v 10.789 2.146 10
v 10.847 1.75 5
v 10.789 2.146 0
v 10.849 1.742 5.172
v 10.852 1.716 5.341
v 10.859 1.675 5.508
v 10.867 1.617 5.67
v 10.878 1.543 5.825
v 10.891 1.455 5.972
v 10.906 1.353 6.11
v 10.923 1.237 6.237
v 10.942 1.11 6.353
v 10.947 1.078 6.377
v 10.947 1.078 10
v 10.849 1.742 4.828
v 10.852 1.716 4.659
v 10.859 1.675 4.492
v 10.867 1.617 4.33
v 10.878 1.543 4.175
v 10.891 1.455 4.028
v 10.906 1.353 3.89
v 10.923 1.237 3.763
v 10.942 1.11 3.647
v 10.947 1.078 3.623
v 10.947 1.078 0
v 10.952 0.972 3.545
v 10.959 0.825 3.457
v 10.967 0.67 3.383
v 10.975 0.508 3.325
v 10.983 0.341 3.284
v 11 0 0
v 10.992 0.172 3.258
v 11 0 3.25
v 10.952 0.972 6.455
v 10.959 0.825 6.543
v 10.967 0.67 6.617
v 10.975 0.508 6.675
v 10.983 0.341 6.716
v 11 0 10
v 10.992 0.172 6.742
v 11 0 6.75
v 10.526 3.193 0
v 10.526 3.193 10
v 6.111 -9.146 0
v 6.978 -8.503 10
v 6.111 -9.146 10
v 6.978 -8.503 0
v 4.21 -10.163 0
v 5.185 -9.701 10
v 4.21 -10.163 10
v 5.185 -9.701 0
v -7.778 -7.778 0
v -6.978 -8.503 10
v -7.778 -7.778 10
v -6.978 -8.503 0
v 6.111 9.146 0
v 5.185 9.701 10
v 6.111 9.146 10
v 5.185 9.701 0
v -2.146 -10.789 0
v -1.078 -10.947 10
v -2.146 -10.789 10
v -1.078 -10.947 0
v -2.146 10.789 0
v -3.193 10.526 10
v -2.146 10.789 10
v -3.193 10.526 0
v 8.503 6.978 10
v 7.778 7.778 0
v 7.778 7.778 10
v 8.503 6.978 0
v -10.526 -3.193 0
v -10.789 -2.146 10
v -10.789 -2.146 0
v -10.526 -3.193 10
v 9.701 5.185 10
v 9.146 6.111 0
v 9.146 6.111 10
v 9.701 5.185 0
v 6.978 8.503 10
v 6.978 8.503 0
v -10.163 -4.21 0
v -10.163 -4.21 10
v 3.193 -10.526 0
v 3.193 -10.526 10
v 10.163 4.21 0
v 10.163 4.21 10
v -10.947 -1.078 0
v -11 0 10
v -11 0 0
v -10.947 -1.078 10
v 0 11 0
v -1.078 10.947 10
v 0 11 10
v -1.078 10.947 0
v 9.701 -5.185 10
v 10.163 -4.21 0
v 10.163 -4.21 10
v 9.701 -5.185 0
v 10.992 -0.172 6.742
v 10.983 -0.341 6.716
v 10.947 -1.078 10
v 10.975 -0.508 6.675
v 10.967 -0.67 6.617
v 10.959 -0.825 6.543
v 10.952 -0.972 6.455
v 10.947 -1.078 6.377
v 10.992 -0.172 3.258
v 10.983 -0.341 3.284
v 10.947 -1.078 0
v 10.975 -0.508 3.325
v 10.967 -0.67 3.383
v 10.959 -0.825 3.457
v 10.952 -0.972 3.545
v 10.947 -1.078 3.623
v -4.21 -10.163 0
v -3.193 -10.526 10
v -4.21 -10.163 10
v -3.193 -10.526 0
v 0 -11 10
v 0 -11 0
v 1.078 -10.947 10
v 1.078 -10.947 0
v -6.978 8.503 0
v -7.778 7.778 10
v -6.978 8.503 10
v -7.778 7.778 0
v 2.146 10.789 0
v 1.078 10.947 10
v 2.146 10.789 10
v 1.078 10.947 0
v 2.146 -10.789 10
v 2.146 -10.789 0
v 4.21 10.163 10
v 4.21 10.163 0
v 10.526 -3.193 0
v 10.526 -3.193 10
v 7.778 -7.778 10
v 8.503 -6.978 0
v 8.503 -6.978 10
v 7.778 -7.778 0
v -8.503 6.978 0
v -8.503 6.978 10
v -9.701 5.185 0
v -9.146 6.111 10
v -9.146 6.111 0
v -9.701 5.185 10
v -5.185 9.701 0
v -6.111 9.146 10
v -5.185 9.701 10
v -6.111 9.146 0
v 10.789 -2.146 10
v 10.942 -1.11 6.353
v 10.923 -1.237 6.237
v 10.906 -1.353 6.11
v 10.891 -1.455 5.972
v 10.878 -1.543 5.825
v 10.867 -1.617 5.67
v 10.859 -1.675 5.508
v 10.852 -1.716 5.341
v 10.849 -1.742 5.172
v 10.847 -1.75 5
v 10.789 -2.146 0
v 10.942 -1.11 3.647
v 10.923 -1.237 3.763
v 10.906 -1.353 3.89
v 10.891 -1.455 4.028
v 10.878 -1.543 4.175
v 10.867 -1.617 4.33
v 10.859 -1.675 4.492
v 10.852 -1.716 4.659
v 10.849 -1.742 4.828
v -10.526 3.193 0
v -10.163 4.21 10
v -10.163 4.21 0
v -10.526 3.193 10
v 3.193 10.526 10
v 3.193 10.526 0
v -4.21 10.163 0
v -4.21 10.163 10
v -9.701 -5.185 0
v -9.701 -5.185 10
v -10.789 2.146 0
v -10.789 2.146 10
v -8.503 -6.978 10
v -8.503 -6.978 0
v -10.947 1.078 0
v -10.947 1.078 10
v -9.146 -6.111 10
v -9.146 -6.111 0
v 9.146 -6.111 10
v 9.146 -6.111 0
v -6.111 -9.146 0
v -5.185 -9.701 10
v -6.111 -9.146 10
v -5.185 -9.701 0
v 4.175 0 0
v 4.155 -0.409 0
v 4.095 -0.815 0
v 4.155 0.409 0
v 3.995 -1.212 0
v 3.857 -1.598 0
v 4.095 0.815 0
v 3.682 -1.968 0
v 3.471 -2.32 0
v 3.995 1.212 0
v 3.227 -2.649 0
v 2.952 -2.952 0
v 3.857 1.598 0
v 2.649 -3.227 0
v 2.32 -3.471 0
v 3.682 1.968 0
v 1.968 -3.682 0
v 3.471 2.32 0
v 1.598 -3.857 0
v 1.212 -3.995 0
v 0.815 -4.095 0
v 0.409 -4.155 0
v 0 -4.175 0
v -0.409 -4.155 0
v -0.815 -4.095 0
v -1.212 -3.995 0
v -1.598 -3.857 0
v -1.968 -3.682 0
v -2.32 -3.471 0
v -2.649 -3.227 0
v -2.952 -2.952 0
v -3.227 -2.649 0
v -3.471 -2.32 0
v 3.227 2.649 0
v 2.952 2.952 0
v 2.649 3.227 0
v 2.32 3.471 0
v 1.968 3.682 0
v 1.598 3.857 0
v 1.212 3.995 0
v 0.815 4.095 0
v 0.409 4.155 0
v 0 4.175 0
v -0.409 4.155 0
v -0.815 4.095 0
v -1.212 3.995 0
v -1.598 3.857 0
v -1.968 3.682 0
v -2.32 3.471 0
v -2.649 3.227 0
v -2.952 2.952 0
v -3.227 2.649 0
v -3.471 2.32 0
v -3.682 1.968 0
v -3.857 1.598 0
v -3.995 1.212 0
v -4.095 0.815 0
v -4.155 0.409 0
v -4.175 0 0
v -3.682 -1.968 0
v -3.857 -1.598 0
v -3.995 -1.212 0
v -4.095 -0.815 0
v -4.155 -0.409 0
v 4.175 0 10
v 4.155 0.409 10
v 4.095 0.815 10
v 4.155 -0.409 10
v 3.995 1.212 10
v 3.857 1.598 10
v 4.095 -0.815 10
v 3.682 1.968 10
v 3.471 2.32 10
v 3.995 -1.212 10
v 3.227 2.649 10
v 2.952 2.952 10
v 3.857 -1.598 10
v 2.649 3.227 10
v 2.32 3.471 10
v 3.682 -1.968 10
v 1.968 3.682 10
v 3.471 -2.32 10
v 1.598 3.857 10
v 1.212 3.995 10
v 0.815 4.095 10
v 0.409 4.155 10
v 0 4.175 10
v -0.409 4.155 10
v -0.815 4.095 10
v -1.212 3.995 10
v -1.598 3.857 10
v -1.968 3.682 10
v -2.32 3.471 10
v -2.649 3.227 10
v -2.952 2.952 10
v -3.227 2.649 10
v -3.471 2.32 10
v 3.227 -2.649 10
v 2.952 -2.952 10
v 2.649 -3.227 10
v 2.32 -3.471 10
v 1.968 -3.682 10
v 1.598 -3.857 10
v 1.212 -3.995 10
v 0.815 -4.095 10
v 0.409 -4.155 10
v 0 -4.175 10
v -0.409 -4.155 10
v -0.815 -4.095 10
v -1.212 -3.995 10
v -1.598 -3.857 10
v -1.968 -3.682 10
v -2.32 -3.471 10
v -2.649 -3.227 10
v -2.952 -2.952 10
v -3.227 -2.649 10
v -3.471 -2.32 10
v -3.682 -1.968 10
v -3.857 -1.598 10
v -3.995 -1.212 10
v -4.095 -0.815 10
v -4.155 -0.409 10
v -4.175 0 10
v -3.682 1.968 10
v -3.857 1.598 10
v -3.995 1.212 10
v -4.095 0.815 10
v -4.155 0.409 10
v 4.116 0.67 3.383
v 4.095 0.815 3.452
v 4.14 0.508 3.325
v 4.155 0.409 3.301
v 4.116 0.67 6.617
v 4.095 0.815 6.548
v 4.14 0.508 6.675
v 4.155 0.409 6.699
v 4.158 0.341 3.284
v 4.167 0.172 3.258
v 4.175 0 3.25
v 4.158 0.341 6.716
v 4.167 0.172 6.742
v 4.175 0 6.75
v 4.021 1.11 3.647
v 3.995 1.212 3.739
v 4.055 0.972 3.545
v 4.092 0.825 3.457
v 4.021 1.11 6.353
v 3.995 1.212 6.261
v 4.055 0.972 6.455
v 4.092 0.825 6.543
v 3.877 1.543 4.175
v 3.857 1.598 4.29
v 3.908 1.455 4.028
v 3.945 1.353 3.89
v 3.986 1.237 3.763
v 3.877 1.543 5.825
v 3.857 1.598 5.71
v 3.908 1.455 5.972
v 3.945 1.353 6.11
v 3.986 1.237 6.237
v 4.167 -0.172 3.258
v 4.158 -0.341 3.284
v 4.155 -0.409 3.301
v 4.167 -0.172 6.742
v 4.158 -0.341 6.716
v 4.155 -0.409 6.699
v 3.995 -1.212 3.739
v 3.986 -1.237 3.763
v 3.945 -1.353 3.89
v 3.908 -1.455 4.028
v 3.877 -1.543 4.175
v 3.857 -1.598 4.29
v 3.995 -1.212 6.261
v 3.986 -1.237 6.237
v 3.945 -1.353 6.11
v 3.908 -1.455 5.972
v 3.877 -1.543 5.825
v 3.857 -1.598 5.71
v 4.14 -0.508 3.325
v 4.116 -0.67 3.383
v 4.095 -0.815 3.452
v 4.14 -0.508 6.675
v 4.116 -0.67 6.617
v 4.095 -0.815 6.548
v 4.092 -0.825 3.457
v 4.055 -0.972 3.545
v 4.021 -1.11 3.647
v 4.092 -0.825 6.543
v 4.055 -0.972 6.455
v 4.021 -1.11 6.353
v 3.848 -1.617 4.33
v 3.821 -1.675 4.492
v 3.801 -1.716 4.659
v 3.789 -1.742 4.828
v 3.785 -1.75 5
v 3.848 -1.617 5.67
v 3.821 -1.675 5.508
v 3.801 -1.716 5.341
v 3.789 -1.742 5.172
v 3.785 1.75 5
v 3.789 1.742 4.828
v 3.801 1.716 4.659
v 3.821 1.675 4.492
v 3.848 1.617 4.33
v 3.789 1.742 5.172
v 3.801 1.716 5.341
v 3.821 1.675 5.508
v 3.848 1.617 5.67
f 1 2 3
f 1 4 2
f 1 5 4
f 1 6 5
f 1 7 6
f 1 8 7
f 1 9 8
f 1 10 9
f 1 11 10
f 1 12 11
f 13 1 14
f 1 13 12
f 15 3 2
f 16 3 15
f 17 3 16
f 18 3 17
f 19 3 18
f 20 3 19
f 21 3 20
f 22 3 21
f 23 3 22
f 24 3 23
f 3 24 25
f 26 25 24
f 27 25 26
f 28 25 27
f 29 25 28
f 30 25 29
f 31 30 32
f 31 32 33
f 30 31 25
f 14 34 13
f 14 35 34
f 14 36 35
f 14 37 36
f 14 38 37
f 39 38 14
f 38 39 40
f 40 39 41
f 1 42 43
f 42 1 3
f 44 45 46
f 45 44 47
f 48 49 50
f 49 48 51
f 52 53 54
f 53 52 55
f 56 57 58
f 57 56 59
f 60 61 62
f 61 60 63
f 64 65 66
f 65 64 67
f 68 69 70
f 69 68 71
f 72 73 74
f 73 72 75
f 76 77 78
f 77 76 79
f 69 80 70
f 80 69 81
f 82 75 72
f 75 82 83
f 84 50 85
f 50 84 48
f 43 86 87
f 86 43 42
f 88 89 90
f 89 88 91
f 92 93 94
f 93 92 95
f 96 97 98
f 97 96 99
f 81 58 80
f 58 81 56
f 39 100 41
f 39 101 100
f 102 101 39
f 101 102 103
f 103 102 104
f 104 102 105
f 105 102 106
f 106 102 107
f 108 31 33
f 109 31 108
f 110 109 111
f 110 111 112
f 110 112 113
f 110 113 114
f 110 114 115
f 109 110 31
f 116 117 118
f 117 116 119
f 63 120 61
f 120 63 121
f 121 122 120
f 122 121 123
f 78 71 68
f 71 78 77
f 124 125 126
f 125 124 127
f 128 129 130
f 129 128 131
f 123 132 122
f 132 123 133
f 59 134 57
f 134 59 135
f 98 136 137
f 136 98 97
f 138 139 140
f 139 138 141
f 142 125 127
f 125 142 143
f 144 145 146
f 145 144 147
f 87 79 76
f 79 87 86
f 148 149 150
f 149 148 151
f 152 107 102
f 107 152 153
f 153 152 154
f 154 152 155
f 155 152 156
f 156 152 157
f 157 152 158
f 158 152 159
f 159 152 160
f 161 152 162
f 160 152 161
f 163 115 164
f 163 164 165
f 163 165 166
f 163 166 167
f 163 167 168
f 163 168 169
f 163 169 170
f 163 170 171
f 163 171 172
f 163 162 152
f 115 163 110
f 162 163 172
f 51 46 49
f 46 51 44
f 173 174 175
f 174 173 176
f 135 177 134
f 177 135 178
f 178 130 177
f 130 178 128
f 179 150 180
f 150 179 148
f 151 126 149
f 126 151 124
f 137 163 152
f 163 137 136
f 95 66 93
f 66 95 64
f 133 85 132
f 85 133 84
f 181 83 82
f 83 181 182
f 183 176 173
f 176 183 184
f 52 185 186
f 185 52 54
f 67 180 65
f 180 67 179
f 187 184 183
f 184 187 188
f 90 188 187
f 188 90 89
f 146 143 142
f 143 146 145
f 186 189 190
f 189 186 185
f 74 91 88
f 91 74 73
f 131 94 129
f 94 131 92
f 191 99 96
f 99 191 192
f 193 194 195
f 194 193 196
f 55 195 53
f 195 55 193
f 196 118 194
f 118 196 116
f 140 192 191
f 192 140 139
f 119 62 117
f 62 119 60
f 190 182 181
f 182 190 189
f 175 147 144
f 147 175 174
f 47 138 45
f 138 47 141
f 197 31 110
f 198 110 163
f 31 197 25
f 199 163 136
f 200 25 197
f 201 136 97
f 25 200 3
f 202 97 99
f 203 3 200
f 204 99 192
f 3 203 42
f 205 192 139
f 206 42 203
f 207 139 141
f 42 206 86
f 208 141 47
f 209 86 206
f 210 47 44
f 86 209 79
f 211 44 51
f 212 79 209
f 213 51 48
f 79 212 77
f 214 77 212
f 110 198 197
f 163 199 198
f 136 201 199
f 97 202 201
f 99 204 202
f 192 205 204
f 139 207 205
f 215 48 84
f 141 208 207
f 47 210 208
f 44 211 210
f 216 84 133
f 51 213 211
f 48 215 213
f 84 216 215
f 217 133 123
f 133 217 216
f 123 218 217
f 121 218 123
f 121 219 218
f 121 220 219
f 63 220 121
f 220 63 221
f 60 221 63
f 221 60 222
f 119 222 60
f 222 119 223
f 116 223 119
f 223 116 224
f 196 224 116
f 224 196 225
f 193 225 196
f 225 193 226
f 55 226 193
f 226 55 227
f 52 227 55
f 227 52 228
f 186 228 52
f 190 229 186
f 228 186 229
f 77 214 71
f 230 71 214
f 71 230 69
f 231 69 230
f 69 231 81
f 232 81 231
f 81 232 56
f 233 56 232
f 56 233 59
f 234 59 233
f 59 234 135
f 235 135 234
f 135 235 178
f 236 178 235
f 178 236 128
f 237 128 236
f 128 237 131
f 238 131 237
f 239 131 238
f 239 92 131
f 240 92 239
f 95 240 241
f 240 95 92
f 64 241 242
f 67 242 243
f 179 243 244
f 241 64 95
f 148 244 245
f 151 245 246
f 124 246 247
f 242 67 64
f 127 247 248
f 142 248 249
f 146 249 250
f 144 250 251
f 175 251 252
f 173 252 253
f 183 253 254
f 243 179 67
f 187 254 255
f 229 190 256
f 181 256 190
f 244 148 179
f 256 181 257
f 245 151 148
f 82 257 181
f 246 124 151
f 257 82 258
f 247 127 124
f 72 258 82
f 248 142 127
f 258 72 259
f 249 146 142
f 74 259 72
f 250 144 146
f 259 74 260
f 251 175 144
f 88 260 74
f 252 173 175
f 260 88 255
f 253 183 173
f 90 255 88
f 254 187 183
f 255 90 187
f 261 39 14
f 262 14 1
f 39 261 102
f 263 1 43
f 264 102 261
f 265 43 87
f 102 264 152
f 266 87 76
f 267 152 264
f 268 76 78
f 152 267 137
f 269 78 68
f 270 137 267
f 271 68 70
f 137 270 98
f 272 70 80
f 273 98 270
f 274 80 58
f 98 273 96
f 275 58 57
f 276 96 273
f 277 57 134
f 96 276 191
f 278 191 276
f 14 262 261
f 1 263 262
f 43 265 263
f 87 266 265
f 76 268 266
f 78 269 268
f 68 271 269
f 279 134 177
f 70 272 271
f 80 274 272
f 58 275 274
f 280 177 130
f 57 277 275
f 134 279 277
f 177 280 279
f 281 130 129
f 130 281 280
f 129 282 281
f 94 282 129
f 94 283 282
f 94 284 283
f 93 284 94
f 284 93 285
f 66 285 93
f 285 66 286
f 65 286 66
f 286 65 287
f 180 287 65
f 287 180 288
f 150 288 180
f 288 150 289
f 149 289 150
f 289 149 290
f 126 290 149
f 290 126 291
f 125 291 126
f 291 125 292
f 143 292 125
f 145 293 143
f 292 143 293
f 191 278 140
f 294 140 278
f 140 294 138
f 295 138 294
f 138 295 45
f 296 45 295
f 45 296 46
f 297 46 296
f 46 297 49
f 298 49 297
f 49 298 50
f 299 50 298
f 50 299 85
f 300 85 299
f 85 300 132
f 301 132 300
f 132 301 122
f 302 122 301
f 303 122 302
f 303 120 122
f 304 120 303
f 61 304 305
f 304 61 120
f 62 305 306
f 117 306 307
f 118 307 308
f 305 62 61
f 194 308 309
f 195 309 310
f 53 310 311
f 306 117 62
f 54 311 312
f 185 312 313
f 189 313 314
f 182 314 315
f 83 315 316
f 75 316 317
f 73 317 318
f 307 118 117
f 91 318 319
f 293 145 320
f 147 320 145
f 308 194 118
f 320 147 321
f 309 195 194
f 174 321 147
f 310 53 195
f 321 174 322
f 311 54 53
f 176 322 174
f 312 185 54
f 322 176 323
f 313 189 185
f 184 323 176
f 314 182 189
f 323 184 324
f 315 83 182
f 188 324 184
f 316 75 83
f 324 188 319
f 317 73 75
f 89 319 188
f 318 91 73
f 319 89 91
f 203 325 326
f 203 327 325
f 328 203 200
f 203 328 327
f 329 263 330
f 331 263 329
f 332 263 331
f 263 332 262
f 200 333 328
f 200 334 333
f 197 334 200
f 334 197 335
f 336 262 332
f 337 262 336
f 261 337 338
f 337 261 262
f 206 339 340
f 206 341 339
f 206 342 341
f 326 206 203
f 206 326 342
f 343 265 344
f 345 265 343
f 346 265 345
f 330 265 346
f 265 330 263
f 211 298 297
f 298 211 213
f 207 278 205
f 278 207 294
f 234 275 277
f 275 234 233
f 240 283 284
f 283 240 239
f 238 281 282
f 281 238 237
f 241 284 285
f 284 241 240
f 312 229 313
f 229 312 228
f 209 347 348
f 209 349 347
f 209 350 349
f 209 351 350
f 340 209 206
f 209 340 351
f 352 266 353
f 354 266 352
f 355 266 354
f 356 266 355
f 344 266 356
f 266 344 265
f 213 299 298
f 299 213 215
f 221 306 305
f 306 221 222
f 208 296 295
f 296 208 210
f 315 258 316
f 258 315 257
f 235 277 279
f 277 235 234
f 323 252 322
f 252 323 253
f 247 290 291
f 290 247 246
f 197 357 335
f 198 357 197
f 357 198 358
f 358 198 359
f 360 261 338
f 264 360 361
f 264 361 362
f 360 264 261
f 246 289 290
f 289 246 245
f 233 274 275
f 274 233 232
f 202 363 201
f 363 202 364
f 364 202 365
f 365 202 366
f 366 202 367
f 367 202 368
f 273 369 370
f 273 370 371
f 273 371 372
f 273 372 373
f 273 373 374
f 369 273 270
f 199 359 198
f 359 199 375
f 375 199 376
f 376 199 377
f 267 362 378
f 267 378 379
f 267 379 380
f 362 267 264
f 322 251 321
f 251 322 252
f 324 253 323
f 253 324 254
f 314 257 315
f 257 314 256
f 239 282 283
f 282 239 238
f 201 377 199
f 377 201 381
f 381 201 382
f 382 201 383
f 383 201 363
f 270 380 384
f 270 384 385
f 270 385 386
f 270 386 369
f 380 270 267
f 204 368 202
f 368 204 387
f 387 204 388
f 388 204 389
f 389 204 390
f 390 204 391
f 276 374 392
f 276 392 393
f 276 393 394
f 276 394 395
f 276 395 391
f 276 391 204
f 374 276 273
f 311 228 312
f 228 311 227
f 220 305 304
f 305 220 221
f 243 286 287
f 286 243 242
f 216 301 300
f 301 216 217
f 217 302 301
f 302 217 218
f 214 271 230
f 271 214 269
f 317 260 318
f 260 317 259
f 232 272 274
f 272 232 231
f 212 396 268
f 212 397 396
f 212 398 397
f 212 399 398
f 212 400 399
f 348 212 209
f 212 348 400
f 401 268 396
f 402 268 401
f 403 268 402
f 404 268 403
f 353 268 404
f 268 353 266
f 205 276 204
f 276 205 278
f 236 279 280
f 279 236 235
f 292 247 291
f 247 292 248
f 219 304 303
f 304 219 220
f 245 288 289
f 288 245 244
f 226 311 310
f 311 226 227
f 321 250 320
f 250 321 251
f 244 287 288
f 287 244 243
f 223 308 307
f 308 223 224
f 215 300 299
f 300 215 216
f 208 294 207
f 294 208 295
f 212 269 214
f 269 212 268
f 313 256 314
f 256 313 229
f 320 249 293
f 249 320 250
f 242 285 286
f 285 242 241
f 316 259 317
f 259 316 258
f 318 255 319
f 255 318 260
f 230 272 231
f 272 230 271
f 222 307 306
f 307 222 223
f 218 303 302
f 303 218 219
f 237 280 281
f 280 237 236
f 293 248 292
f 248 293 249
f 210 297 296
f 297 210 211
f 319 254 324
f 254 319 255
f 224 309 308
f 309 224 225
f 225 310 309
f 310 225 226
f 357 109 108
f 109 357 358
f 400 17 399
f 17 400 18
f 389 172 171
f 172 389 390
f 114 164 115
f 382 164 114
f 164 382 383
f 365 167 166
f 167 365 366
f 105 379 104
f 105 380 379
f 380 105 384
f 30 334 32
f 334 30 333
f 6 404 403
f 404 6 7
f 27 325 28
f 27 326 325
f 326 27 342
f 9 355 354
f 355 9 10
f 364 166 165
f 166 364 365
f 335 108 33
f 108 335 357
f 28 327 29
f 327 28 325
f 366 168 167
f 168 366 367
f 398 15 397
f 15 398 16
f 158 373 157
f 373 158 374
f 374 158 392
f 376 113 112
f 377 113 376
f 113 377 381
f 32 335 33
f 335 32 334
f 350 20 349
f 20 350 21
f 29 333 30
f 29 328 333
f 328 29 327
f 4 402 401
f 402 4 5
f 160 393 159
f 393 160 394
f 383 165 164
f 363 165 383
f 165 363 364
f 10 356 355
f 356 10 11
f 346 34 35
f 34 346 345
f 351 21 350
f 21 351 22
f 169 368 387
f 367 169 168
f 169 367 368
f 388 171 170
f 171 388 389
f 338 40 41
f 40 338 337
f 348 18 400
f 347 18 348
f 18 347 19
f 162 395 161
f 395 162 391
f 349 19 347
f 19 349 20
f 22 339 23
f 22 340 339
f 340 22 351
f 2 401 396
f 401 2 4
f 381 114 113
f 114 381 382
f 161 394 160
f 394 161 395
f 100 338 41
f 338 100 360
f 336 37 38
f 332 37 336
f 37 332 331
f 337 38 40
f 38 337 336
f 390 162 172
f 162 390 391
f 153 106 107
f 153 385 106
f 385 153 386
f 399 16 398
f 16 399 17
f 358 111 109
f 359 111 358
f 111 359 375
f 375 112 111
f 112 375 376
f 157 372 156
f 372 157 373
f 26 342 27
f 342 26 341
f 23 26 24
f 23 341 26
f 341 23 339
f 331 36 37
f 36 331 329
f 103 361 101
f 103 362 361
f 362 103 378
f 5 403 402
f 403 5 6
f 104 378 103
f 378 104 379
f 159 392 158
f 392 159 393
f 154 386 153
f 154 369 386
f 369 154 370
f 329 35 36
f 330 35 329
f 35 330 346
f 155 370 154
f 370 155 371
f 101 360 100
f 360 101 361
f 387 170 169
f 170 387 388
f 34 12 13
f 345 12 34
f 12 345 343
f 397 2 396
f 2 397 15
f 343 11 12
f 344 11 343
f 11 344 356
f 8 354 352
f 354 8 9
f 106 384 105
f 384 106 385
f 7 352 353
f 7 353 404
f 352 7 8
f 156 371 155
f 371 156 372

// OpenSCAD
// file: parameters.scad
// =============================================================================
// Gen-AH Dual-rotor copper-centroid hypermicro AFPM — WOUND-AWARE (HARD GATE)
// PRIMARY challenger vs Gen-AE. Magnets @ R=41 over copper centroid + 180 t + m2m 4.96.
// =============================================================================

// --- Wire / wind budget (26 AWG, ~1 lb spool ≈ 390 m bare-equiv) --------------
wire_awg            = 26;
wire_od             = 0.45;     // insulated OD mm
turns               = 180;      // +10 vs Gen-AE 170
fill                = 0.70;
layers_per_face     = 2;        // axial layers proud of EACH flange
wind_build_axial    = layers_per_face * wire_od * fill;   // 0.63 mm
wind_build_radial   = 3 * wire_od * fill;                 // 0.945 mm

// --- Pancake former (bare STL) -----------------------------------------------
coil_id_r           = 16.5;     // copper-centroid window vs AE 18.5–64
coil_od_r           = 66.0;
span_deg            = 26.0;     // 12 stations × 30° pitch
former_web          = 1.50;
flange_t            = 0.60;
wall                = 1.2;
slot_w              = 2.4;
mount_hole          = 3.5;
tab_len             = 7.0;

former_bare_h       = former_web + 2 * flange_t;            // 2.70 mm
coil_envelope_h     = former_bare_h + 2 * wind_build_axial; // 3.96 mm

// --- Running clearance (magnet face → WOUND face) EACH side ------------------
run_clear           = 0.50;     // PASS floor ≥ 0.5
gap_spacer_h        = run_clear + wind_build_axial;         // 1.13 mm
m2m                 = coil_envelope_h + 2 * run_clear;      // 4.96 mm (beats Gen-AE 5.00)

// --- Mid stator (12 pancakes 3φ; winds proud both faces) ---------------------
coil_stations       = 12;
bay_r_in            = coil_id_r - 2.0 - wind_build_radial;
bay_r_out           = coil_od_r + 2.0 + wind_build_radial;
bay_span            = span_deg + 4.0;
bay_offset          = 2.0;
stator_thick        = former_bare_h;                        // winds proud ±Z
stator_od           = 160.0;
shaft_clear_stator  = 34.0;
coil_mount_r        = 26.0;

// --- Rotors (×2) — 8×Ø20 @ R=41 (copper centroid) + 24×Ø5 Halbach ------------
large_pocket_d      = 20.3;
small_pocket_d      = 5.3;
pocket_h            = 5.2;
large_n             = 8;
R_large             = 41.0;     // covers ~31–51 over copper centroid ~41
R_small_inner       = 26.0;
R_small_mid         = 41.0;
R_small_outer       = 58.0;
carrier_od          = 156.0;
carrier_thick       = 7.5;
hub_h               = 10.0;
hub_od              = 30.0;
rotor_b_offset_deg  = 22.5;

// --- Modular MAX interface (Gen-E family) ------------------------------------
shaft_bore          = 8.35;
bearing_d           = 21.85;
bearing_h           = 7.2;
m3_clear            = 3.5;
bolt_r_inner        = 36.0;
bolt_n_inner        = 6;
flange_bolt_r       = 72.0;
flange_bolt_n       = 6;
brace_r             = 68.0;
brace_d             = 4.3;
brace_n             = 4;

spacer_pad_od       = 14.0;
spacer_pad_id       = m3_clear;
endbell_od          = 160.0;
endbell_thick       = 8.0;
endbell_shaft_clear = 10.0;

$fn = 64;
// main file
// Gen-AH shaft collar — print ×2–4
include <parameters.scad>;
$fn = 64;
od = 22; id = shaft_bore; h = 10; set_d = 3.5;
difference() {
    cylinder(d=od, h=h);
    translate([0, 0, -0.1]) cylinder(d=id, h=h + 0.2);
    translate([0, 0, h/2]) rotate([0, 90, 0]) cylinder(d=set_d, h=od);
}
